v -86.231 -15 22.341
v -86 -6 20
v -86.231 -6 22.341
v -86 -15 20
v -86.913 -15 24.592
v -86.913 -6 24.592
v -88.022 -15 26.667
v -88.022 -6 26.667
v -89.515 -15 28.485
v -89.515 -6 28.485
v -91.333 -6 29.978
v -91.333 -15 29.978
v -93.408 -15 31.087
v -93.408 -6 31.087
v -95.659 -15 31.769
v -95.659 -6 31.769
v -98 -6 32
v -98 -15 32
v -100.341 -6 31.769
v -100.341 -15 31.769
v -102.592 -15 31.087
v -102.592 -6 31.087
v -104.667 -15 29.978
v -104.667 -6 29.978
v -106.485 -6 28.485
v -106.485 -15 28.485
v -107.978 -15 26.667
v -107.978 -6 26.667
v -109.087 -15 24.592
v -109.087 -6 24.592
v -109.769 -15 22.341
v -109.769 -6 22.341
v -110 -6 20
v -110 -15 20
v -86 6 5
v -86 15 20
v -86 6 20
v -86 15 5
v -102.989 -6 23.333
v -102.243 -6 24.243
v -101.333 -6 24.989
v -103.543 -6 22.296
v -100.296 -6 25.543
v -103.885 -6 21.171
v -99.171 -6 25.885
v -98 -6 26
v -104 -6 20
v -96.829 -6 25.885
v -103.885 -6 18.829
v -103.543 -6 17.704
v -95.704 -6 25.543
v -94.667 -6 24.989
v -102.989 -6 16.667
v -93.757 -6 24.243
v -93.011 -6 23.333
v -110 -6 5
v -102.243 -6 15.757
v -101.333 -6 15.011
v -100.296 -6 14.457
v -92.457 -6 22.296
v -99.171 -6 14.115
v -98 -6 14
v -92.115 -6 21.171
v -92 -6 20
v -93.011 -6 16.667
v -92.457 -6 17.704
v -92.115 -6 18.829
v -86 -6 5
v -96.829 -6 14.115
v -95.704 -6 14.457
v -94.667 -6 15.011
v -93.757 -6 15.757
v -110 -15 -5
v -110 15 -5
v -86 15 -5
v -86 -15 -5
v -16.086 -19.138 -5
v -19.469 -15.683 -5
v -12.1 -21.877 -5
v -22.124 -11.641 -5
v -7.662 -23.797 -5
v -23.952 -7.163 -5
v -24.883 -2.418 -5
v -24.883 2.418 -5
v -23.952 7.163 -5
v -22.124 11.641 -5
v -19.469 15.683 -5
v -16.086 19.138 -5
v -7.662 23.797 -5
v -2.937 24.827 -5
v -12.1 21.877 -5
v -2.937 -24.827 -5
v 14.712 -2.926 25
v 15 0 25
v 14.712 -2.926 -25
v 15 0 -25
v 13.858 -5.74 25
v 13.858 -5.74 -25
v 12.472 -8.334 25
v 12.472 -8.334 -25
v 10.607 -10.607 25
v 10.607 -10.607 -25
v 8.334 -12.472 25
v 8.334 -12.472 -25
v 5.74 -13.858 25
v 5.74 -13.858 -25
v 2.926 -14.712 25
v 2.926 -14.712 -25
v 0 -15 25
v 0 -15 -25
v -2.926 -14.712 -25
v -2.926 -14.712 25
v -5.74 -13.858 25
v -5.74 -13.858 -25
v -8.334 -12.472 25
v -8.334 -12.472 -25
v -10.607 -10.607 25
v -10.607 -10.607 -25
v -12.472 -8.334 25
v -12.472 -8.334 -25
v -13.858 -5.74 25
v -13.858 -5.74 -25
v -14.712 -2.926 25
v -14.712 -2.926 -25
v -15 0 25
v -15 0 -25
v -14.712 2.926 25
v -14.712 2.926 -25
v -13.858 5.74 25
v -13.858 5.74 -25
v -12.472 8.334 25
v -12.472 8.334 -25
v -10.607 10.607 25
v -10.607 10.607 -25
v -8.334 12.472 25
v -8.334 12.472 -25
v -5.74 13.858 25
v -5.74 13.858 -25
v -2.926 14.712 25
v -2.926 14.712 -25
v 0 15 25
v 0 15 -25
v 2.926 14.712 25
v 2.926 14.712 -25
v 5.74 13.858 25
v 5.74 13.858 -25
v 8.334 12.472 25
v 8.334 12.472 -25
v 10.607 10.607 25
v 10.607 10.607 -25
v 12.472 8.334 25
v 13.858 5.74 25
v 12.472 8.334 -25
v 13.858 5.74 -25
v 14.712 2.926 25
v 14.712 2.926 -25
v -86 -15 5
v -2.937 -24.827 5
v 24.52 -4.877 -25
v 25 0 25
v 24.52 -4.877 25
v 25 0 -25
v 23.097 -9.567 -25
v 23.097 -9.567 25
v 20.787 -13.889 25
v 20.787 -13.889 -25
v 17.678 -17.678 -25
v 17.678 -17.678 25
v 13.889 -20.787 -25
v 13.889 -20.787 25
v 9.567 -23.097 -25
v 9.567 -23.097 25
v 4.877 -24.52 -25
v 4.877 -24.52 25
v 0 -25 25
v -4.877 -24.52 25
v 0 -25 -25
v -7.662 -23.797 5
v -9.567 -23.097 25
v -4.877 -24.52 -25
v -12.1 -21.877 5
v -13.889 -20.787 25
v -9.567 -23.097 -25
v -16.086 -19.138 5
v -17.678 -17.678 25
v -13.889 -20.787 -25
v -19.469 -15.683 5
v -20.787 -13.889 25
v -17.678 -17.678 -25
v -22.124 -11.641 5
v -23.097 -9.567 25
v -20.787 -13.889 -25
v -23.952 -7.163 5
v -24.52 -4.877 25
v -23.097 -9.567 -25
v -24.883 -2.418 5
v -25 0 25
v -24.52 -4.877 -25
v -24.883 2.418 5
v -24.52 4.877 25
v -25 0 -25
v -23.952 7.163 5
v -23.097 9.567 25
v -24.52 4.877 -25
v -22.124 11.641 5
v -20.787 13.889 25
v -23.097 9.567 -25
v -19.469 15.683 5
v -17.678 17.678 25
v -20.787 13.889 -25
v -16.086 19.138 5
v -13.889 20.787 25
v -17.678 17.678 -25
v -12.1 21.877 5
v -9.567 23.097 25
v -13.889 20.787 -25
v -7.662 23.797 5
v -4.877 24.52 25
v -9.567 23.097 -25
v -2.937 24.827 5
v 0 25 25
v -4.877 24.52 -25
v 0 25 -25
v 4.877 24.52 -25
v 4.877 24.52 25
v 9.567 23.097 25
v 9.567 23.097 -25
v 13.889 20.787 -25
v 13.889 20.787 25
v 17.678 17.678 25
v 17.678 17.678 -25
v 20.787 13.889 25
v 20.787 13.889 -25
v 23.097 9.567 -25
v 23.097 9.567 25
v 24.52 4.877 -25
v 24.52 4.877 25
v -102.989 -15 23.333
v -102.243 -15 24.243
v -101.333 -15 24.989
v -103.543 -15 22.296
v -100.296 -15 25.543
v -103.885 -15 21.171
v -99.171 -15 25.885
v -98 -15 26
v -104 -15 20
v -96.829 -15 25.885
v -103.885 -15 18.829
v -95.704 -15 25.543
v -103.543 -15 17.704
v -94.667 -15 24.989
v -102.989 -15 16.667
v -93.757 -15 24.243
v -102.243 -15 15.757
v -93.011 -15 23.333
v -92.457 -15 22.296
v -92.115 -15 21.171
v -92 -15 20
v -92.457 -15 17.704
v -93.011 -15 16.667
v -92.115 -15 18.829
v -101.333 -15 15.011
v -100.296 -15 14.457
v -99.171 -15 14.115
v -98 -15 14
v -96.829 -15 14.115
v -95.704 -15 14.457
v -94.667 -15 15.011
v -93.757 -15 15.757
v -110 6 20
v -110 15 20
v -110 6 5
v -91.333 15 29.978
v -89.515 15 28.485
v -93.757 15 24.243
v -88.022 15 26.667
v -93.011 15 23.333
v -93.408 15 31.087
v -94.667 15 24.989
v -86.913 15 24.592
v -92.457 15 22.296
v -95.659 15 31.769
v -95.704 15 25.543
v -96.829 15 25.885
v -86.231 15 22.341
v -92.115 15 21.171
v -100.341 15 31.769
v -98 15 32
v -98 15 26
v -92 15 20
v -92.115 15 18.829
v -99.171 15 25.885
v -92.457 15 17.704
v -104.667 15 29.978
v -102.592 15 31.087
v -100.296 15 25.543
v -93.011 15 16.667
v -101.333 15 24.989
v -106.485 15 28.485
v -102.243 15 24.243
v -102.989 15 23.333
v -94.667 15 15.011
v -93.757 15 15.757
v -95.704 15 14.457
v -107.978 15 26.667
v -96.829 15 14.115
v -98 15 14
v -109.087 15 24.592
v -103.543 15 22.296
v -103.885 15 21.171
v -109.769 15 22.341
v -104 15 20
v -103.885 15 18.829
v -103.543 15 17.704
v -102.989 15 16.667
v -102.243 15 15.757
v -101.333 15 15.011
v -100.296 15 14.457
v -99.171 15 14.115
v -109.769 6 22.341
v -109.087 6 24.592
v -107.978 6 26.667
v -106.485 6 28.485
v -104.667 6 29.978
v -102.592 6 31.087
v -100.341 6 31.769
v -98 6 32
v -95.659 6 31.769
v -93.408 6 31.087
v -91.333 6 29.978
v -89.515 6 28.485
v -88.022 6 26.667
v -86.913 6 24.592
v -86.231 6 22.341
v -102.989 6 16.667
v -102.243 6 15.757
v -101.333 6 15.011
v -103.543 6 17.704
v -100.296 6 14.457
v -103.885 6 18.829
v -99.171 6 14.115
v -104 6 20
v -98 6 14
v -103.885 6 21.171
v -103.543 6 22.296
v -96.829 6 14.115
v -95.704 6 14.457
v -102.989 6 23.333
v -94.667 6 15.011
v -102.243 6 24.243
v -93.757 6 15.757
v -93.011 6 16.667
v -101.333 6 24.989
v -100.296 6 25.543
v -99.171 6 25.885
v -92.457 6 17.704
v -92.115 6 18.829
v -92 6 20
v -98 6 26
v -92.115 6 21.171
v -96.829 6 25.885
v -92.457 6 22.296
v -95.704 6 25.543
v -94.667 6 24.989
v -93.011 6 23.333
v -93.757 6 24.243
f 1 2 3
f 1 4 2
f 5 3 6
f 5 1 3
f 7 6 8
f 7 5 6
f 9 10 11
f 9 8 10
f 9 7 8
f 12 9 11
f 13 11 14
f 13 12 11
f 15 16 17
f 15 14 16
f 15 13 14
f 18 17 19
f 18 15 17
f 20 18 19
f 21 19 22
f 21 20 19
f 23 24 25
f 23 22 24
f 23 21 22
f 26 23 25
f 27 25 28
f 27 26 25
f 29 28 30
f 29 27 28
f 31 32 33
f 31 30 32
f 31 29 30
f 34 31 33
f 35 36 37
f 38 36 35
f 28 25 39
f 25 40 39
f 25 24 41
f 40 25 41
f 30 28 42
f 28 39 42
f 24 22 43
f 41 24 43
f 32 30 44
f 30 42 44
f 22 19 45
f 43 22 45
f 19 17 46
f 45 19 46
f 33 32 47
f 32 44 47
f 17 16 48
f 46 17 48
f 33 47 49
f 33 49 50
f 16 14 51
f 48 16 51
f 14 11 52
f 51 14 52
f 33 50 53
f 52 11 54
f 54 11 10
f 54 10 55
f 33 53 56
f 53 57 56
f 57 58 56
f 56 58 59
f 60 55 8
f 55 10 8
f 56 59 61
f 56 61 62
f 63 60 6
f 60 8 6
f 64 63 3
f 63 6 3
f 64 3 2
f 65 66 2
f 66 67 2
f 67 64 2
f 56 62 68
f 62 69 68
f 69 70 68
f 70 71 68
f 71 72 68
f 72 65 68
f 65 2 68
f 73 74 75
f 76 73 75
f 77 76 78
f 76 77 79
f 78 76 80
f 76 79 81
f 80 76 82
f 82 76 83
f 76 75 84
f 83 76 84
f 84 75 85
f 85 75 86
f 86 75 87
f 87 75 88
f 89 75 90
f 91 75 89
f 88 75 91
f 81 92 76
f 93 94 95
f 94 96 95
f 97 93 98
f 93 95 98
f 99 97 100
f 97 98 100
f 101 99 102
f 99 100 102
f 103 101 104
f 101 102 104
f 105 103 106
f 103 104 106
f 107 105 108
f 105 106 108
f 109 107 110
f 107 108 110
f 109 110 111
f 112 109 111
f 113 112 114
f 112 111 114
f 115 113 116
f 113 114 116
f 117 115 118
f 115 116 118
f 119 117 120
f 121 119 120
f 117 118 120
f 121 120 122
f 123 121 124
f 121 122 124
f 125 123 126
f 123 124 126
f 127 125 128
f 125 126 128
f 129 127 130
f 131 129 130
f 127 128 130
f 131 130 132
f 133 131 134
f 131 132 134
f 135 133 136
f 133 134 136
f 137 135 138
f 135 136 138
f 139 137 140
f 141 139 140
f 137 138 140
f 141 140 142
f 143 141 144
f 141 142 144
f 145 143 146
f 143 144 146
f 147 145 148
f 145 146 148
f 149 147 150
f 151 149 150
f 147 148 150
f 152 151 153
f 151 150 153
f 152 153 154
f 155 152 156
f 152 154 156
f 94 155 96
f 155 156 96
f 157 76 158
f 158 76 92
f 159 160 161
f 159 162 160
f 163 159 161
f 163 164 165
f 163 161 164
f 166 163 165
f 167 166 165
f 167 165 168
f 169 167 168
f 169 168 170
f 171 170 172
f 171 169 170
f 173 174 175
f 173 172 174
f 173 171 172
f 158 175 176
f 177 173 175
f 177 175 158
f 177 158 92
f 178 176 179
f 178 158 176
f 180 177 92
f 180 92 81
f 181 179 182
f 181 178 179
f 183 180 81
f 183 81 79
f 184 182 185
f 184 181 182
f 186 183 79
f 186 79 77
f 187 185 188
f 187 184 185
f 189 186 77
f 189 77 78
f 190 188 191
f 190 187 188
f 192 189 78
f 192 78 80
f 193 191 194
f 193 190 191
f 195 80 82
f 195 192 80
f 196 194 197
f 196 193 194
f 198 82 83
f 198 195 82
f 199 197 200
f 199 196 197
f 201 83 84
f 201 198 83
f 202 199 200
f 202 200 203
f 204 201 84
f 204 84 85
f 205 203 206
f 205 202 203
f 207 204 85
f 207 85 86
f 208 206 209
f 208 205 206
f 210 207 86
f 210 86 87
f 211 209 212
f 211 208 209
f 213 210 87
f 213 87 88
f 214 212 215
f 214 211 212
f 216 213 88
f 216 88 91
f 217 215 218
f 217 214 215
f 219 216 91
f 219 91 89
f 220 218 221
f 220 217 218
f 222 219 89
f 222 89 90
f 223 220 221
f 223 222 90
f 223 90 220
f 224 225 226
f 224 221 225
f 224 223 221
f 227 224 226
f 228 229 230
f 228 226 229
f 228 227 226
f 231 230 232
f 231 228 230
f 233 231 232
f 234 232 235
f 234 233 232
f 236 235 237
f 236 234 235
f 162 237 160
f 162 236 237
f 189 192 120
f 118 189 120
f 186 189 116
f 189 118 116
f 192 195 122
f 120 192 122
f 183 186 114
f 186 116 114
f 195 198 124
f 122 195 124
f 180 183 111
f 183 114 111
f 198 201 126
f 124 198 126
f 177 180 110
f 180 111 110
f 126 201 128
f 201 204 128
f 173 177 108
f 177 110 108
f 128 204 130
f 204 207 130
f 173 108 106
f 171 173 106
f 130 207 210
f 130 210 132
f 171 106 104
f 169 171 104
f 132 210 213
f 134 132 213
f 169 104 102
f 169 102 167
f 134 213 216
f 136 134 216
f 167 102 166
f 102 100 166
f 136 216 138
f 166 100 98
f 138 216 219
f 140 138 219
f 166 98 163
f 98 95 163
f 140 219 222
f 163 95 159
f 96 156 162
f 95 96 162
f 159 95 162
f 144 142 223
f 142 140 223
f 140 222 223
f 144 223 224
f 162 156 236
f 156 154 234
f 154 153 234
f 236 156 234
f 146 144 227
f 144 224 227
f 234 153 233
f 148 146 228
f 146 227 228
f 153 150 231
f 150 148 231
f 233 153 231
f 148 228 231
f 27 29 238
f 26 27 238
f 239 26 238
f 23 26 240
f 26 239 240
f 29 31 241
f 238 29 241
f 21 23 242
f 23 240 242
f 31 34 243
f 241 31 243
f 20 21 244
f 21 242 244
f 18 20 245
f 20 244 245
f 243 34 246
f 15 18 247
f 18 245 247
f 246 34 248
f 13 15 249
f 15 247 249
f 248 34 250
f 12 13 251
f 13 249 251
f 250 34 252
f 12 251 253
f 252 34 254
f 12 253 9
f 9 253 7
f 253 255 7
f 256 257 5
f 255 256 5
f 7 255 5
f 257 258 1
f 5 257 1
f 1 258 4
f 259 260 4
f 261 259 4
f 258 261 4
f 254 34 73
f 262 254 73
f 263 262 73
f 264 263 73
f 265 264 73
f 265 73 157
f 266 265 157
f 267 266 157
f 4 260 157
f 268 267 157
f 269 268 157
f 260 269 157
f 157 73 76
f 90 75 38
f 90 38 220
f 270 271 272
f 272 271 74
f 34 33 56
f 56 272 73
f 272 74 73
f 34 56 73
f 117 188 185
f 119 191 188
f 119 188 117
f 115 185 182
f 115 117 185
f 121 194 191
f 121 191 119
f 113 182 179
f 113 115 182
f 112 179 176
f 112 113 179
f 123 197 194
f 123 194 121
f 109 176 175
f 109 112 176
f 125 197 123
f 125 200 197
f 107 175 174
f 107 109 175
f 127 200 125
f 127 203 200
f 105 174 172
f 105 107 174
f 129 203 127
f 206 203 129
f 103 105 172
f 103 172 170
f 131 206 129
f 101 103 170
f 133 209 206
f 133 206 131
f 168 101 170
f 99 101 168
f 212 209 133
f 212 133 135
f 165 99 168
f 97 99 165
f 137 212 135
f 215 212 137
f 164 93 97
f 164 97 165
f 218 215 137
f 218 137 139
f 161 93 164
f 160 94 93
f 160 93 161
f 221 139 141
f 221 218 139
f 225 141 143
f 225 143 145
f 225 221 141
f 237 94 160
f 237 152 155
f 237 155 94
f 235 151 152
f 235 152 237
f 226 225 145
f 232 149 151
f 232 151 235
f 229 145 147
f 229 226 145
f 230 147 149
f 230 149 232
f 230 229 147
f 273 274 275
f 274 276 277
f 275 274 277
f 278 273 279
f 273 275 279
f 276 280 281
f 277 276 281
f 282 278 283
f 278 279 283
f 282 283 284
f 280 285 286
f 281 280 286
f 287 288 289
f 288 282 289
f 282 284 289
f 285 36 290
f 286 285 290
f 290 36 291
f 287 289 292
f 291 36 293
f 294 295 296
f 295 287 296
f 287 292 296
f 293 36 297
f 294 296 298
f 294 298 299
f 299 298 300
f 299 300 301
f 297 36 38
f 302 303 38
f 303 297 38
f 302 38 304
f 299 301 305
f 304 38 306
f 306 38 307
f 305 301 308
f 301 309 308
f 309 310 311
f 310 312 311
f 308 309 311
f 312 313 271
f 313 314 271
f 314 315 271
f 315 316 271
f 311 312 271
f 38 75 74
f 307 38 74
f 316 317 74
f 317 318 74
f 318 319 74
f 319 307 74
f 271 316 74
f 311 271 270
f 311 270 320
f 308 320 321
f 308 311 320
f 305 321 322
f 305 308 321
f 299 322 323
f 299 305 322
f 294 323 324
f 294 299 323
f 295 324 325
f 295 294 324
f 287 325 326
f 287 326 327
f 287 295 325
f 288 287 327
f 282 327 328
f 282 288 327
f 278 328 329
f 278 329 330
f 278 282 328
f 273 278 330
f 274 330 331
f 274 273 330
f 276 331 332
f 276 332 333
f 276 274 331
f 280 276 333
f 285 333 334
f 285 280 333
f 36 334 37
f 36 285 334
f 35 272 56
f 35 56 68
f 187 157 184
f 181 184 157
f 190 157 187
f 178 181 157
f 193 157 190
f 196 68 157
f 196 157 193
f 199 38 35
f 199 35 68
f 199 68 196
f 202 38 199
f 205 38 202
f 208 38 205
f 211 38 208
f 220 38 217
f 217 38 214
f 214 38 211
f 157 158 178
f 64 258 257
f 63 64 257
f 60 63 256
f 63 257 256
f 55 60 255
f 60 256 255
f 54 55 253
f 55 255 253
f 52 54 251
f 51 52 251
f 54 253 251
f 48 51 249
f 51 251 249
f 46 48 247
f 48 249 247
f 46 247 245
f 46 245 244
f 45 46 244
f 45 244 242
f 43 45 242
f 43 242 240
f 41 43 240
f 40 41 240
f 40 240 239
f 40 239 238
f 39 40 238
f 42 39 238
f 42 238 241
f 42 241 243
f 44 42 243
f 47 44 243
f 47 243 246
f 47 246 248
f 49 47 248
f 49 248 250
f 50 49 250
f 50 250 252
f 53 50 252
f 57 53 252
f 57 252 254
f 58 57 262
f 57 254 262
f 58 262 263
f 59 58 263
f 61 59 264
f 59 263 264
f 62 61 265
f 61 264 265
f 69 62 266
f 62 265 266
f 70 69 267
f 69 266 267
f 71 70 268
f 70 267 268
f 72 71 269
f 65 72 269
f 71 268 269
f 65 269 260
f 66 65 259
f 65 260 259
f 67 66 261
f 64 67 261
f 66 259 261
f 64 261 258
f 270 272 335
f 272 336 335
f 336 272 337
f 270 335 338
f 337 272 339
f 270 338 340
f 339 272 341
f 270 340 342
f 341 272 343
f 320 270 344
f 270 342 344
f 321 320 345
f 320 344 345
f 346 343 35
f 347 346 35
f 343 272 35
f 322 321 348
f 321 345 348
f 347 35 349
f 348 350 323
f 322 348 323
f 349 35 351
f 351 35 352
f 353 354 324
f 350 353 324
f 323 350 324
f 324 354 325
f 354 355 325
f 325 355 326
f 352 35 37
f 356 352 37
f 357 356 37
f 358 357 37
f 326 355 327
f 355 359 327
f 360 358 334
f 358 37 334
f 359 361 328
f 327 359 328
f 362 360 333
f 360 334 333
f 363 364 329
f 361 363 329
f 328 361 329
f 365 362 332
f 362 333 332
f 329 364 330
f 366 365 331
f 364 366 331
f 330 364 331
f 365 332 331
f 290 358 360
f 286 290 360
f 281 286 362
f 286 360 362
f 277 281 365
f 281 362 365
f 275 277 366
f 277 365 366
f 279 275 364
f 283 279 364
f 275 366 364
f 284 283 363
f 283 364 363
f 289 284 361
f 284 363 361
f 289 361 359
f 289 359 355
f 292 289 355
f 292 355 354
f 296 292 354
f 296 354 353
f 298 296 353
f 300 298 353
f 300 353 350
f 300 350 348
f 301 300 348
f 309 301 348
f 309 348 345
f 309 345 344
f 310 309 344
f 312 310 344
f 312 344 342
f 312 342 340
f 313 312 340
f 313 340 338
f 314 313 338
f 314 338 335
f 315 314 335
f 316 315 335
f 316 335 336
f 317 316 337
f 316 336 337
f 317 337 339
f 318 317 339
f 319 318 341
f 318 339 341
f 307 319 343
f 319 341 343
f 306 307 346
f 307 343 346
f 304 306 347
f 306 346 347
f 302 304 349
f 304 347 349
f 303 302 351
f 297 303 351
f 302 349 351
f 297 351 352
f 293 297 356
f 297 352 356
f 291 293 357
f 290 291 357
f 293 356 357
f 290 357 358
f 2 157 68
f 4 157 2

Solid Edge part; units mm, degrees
sketch "Sketch1" plane through (0, 0, 0) normal (0, 0, 1) x (1, 0, 0)
  circle A0 centre (0, 0) radius 25
extrude "Protrusion1" add sketch "Sketch1" along normal mid plane 50
sketch "Sketch2" plane through (0, 0, 0) normal (0, 0, 1) x (1, 0, 0)
  line L0 (-86, -15) -> (-2.9372, -24.8269)
  line L1 (-110, -15) -> (-86, -15)
  line L2 (-110, 15) -> (-110, -15)
  line L3 (-86, 15) -> (-110, 15)
  line L4 (-86, 15) -> (-2.9372, 24.8269)
extrude "ExtrudedProtrusion_2" add sketch "Sketch2" along normal mid plane 10 material side at (-44.4745, -19.9631, 0)
sketch "Sketch3" plane through (0, 0, 0) normal (0, 0, 1) x (1, 0, 0)
  circle A0 centre (0, 0) radius 15
extrude "Cutout1" cut sketch "Sketch3" along normal up to next and the other way up to next
sketch "Sketch4" plane through (-98, -15, 0) normal (0, -1, 0) x (1, 0, 0)
  line L0 (12, 5) -> (12, 20)
  line L1 (12, 5) -> (-12, 5)
  line L2 (-12, 5) -> (-12, 20)
  arc A0 (-12, 20) -> (12, 20) centre (0, 20) cw
extrude "ExtrudedProtrusion_3" add sketch "Sketch4" against normal blind 9
mirror "Mirror1" about plane through (0, 0, 0) normal (0, -1, 0) of "ExtrudedProtrusion_3"
sketch "Sketch5" plane through (-98, -15, 0) normal (0, -1, 0) x (1, 0, 0)
  circle A0 centre (0, 20) radius 6
extrude "Cutout2" cut sketch "Sketch5" against normal through all
